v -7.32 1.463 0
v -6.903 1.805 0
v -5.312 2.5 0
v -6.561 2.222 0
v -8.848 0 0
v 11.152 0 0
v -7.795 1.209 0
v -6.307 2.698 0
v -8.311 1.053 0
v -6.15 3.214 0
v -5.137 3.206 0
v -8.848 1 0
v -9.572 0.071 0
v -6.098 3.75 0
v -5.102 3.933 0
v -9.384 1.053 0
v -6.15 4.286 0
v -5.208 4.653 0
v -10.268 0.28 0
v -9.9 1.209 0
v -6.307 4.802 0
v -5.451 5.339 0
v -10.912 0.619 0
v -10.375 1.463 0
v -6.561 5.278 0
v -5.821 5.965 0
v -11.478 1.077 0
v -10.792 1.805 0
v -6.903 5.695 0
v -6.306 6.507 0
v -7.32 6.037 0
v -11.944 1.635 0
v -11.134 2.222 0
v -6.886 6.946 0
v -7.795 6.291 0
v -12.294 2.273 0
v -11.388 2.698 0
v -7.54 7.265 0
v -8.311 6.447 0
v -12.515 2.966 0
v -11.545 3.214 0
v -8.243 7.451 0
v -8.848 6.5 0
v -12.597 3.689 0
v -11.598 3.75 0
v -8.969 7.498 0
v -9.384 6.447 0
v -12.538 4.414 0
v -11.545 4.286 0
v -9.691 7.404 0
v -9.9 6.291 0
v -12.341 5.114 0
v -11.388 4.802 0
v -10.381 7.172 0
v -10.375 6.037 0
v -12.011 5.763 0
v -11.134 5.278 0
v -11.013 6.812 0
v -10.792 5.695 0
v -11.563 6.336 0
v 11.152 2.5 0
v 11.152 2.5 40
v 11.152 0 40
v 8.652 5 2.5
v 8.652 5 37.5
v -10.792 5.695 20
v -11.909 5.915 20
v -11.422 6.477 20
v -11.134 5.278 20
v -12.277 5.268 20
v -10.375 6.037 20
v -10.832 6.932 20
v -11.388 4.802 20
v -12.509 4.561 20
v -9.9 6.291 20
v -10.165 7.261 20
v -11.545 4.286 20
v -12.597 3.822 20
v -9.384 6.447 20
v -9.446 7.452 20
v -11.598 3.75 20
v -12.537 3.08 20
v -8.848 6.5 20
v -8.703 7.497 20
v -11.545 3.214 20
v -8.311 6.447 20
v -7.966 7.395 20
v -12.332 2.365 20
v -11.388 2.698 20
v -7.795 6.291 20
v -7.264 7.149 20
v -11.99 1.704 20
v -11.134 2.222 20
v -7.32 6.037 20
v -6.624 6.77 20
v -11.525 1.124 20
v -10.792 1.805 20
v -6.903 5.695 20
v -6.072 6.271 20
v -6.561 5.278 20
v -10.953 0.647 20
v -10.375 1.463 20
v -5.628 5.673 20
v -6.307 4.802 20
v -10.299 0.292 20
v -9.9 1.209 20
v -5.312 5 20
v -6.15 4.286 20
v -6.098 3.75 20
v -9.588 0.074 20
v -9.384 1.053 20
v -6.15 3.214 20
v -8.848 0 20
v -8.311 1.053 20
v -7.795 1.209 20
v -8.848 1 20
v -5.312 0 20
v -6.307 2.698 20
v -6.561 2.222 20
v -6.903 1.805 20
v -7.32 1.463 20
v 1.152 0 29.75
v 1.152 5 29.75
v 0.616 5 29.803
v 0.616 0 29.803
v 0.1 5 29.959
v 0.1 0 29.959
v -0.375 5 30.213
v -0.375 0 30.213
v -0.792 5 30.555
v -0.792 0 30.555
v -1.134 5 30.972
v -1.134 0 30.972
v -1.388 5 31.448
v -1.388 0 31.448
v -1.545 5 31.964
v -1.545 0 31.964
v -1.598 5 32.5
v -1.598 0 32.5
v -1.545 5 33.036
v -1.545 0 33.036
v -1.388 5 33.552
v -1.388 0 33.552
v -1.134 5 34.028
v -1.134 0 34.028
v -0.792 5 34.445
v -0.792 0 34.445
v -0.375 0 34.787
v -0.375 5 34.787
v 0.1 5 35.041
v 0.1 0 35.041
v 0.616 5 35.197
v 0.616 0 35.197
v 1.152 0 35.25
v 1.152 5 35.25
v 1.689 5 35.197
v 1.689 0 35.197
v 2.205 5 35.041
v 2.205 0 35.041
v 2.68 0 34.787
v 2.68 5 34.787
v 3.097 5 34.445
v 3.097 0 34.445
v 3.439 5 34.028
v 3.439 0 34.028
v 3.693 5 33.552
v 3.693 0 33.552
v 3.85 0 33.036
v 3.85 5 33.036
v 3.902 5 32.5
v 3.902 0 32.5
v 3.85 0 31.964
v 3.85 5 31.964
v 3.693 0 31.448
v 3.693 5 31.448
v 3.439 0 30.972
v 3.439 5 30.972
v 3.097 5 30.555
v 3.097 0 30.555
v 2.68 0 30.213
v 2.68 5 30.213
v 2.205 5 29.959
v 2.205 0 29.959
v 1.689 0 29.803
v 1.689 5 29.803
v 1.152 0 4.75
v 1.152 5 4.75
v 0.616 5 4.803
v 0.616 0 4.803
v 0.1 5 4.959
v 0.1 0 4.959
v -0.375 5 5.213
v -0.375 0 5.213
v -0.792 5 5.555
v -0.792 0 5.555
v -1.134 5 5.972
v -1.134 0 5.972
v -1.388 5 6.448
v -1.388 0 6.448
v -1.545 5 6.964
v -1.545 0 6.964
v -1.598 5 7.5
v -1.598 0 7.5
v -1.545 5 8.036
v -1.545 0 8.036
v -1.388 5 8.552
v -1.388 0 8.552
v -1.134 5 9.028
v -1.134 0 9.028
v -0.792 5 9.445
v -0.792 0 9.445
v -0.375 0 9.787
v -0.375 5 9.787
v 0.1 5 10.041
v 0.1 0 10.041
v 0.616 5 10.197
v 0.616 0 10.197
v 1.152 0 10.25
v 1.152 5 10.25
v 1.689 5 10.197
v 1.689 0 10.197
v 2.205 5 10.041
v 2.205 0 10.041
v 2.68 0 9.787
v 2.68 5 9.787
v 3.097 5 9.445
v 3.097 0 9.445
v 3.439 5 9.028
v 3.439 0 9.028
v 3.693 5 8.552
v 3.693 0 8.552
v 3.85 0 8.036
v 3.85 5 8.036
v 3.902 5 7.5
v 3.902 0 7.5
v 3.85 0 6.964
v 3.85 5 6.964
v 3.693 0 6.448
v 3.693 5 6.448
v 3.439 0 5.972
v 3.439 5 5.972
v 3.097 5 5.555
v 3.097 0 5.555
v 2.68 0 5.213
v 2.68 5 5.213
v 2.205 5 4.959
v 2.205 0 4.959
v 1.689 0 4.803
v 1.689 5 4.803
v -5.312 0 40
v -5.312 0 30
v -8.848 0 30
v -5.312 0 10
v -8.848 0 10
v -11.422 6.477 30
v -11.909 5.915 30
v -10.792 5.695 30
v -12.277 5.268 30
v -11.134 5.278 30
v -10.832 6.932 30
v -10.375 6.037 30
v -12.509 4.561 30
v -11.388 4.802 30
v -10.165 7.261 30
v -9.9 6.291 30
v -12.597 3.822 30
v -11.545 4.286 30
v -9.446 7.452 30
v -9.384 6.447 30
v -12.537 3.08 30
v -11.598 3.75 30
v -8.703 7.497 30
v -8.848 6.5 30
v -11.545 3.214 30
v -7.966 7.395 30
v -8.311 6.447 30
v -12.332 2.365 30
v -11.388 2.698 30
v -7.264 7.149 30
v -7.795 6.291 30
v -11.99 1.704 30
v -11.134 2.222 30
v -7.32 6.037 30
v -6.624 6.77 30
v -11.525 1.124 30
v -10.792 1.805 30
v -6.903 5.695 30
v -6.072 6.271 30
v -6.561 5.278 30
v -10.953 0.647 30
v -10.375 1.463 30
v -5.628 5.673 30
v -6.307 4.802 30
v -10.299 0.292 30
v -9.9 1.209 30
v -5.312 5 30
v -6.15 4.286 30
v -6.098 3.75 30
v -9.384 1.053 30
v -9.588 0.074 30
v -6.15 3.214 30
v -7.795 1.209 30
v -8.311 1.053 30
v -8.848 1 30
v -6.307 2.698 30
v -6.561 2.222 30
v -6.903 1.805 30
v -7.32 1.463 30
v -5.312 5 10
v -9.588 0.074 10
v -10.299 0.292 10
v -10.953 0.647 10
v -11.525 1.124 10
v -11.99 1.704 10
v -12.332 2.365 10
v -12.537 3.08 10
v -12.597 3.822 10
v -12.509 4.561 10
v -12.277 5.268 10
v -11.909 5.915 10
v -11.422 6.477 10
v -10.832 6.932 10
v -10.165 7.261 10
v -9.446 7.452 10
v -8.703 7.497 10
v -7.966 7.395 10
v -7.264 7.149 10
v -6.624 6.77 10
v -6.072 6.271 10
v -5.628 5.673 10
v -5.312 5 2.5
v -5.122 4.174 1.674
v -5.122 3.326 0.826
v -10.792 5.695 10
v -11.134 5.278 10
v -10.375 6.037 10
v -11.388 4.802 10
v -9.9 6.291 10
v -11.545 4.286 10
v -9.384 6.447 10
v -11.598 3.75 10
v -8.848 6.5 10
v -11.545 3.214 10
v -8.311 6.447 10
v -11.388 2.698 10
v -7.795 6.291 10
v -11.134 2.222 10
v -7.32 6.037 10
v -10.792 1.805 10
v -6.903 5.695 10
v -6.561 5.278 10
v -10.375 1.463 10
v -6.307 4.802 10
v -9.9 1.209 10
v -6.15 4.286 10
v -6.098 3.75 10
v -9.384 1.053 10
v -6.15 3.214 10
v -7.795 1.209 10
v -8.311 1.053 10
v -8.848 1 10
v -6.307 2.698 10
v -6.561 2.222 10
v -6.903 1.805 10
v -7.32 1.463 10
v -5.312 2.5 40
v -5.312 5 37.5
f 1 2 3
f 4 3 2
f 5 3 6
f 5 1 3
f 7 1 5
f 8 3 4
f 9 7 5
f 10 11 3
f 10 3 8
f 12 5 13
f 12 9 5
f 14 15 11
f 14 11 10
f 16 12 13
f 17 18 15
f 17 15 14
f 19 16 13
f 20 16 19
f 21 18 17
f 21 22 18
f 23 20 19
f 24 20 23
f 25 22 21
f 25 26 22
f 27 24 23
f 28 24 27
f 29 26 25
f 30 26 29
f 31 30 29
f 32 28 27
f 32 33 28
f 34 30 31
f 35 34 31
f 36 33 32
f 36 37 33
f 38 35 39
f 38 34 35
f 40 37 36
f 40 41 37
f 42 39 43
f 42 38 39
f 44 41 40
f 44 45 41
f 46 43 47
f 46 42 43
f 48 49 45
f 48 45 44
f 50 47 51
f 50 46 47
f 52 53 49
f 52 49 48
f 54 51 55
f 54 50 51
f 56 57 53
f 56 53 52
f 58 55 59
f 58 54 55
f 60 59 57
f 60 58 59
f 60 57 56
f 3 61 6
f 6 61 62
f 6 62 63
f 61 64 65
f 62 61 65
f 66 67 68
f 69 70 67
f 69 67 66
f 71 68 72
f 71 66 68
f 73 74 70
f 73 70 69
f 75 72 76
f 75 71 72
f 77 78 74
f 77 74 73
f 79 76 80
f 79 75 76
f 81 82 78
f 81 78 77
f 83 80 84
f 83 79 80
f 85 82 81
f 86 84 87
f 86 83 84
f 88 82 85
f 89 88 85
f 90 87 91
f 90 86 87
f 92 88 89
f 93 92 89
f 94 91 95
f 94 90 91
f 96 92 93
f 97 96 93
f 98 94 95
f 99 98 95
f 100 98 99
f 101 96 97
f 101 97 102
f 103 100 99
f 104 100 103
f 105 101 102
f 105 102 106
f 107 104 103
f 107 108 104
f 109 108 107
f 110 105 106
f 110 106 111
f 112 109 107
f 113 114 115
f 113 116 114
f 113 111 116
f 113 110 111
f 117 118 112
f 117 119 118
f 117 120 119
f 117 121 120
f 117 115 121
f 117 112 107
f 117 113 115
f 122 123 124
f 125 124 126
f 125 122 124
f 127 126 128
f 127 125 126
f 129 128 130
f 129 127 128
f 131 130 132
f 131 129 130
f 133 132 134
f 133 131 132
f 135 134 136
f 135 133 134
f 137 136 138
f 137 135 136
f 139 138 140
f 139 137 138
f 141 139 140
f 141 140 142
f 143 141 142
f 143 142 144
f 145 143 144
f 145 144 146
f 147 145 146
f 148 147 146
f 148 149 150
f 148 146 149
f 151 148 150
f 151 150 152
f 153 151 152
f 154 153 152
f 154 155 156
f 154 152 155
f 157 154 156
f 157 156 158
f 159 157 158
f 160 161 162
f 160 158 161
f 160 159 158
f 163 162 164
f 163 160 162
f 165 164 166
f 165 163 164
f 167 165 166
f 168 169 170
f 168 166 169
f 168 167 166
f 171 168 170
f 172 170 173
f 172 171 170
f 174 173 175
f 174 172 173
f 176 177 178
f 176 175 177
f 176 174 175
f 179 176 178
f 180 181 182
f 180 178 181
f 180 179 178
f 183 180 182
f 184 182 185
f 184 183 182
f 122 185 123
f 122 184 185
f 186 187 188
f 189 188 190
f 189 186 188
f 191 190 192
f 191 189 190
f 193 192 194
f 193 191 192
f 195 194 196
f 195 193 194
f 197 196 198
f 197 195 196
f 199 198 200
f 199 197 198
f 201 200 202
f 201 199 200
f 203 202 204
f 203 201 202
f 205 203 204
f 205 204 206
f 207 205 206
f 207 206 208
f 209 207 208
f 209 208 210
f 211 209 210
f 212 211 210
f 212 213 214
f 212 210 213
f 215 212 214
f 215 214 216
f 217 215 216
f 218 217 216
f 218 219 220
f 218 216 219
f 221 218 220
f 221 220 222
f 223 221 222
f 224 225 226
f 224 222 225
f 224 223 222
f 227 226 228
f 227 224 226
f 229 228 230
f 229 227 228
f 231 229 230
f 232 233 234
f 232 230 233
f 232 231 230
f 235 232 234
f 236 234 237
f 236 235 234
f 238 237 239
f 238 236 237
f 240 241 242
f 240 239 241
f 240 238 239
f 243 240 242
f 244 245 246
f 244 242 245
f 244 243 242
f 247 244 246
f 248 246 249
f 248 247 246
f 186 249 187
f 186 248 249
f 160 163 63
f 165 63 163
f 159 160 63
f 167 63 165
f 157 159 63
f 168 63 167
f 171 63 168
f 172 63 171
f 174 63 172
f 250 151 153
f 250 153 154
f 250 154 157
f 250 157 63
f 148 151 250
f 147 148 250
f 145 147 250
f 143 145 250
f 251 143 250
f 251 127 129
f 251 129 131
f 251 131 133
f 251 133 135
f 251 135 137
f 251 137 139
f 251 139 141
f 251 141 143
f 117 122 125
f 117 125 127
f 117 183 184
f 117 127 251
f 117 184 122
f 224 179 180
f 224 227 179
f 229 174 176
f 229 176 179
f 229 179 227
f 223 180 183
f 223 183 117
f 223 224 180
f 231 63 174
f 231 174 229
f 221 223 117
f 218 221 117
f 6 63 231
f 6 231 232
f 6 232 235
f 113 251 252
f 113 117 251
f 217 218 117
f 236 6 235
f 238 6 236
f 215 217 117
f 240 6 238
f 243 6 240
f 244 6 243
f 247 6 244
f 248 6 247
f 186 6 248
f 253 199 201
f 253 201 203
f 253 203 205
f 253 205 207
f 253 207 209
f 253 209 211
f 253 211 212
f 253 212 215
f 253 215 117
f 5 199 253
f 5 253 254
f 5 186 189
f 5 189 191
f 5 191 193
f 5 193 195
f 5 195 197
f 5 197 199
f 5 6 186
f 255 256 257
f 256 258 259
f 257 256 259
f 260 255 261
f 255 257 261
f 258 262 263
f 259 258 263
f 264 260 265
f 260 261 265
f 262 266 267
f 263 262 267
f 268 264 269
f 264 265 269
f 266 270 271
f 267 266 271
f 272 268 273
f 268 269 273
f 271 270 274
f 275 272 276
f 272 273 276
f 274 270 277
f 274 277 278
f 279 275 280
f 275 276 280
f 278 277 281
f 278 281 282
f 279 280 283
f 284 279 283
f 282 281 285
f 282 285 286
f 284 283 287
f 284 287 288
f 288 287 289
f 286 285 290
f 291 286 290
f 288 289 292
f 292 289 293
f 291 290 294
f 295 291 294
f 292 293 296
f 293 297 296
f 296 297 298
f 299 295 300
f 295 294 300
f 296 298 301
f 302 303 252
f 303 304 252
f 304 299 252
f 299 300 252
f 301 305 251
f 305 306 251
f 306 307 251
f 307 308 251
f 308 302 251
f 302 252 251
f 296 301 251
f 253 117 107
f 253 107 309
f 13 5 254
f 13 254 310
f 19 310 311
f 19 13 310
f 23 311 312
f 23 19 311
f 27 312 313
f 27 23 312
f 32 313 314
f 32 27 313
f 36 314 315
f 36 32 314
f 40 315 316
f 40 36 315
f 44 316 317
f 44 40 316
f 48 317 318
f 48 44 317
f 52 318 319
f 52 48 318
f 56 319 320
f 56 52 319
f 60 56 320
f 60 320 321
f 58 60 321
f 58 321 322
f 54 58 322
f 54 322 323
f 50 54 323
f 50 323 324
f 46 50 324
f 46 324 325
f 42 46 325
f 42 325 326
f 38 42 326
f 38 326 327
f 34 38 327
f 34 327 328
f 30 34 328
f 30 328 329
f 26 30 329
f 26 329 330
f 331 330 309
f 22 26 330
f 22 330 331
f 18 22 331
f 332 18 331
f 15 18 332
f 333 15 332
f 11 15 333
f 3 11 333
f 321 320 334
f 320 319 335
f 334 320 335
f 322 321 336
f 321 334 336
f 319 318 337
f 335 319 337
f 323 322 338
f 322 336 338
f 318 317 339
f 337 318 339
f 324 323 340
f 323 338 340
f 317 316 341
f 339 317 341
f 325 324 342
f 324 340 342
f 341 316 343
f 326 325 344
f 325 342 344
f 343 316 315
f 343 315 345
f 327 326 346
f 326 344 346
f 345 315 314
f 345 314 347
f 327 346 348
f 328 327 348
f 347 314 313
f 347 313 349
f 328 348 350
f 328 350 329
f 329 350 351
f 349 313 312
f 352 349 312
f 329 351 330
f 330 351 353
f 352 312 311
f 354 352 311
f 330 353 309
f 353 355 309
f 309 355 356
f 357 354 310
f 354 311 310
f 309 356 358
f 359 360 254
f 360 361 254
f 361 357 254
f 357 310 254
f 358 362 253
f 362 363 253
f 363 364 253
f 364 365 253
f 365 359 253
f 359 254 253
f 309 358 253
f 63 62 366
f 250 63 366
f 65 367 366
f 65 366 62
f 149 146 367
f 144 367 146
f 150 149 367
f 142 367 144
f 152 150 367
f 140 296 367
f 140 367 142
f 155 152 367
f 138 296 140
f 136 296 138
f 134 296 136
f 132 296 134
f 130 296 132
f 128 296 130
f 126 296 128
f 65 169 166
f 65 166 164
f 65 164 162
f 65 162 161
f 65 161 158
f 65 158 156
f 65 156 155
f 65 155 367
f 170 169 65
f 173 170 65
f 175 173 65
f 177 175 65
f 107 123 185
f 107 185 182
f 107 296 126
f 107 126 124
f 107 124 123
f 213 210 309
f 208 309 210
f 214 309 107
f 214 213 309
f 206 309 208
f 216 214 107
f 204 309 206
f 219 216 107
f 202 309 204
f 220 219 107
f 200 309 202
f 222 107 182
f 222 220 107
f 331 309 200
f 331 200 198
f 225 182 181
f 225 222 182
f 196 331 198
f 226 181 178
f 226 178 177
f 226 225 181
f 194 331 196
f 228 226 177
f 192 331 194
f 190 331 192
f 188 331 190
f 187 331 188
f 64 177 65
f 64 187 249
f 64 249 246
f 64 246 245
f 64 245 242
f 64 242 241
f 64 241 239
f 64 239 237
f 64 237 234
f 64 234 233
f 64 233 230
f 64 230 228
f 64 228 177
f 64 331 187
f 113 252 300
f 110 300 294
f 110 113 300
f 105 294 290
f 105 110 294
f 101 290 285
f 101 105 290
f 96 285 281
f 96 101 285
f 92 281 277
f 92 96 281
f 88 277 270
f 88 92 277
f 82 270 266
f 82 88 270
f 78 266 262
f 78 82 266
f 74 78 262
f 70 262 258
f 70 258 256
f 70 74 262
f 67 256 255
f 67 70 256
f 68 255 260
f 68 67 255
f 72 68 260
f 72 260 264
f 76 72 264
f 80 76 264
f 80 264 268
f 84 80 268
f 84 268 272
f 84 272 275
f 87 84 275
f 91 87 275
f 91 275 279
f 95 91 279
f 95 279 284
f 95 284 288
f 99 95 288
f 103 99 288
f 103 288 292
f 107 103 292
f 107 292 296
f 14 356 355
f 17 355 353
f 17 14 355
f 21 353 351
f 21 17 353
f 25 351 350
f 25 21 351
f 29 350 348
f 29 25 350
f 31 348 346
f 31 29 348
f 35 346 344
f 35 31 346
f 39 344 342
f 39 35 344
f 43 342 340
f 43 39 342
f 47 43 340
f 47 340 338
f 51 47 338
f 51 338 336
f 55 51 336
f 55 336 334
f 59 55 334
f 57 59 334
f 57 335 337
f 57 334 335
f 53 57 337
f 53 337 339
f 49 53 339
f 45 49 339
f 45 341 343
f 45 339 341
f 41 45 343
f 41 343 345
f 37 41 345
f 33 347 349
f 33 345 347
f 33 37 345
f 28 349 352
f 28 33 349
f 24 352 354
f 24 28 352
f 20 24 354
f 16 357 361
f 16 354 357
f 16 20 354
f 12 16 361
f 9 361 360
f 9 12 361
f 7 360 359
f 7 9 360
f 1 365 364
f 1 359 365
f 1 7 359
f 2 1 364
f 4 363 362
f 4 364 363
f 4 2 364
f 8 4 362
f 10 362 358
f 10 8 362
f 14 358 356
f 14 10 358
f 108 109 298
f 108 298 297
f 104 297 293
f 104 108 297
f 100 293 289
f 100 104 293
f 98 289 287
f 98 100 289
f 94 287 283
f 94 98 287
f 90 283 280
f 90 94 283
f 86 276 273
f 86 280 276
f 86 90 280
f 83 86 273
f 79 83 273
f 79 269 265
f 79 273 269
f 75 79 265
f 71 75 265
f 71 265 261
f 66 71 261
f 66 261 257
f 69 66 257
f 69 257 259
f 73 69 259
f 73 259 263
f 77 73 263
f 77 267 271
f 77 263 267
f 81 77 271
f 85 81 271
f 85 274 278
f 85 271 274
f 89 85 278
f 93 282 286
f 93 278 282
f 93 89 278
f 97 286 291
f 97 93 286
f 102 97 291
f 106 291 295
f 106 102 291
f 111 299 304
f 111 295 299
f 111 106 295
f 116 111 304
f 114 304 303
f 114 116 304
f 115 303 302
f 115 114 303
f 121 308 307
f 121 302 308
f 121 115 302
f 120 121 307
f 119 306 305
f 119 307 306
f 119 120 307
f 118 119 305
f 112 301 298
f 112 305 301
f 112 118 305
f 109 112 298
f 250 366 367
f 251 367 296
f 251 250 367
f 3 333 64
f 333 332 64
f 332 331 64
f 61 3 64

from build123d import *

# Parameters (mm, degrees)
IZIM1_R                     = 2.75
Y_KSEKLIK_EKSTR_ZYON1_DEPTH = 40
IZIM2_R                     = 2.75
IZIM2_W                     = 7.285533906
IZIM2_H                     = 10
KES_EKSTR_ZYON1_DEPTH       = 40
PAH1_SIZE                   = 2.5


with BuildPart() as part:
    # Çizim1 → Yükseklik-Ekstrüzyon1 (new body)
    with BuildSketch(Plane.XY):
        with BuildLine():
            Line((-4.545775403, 5), (11.152492002, 5))
            Line((11.152492002, 5), (11.152492002, 0))
            Line((11.152492002, 0), (-8.847507998, 0))
            ThreePointArc((-8.847507998, 0), (-11.909370176, 5.915063509), (-5.311974092, 5))
            Line((-5.311974092, 5), (-4.545775403, 5))
        make_face()
        with Locations((-8.847507998, 3.75)):
            Circle(IZIM1_R, mode=Mode.SUBTRACT)
    extrude(amount=Y_KSEKLIK_EKSTR_ZYON1_DEPTH)

    # Çizim2 → Kes-Ekstrüzyon1 (cut)
    with BuildSketch(Plane(origin=(0, 0, 0), x_dir=(1, 0, 0), z_dir=(0, 1, 0))):
        with Locations(Location((1.152492002, -7.5, 0), (0, 0, 90))):
            Circle(IZIM2_R)
        with Locations(Location((1.152492002, -32.5, 0), (0, 0, 90))):
            Circle(IZIM2_R)
        with Locations((-8.954741045, -35)):
            Rectangle(IZIM2_W, IZIM2_H)
        with Locations((-8.954741045, -15)):
            Rectangle(IZIM2_W, IZIM2_H)
    extrude(amount=KES_EKSTR_ZYON1_DEPTH, mode=Mode.SUBTRACT)

    # Pah1
    pah1_edges = [part.edges().sort_by_distance(p)[0] for p in [
        (2.920258955, 5, 40),
        (2.920258955, 5, 0),
        (11.152492002, 5, 20),
    ]]
    chamfer(pah1_edges, length=PAH1_SIZE)


solid = part.part
